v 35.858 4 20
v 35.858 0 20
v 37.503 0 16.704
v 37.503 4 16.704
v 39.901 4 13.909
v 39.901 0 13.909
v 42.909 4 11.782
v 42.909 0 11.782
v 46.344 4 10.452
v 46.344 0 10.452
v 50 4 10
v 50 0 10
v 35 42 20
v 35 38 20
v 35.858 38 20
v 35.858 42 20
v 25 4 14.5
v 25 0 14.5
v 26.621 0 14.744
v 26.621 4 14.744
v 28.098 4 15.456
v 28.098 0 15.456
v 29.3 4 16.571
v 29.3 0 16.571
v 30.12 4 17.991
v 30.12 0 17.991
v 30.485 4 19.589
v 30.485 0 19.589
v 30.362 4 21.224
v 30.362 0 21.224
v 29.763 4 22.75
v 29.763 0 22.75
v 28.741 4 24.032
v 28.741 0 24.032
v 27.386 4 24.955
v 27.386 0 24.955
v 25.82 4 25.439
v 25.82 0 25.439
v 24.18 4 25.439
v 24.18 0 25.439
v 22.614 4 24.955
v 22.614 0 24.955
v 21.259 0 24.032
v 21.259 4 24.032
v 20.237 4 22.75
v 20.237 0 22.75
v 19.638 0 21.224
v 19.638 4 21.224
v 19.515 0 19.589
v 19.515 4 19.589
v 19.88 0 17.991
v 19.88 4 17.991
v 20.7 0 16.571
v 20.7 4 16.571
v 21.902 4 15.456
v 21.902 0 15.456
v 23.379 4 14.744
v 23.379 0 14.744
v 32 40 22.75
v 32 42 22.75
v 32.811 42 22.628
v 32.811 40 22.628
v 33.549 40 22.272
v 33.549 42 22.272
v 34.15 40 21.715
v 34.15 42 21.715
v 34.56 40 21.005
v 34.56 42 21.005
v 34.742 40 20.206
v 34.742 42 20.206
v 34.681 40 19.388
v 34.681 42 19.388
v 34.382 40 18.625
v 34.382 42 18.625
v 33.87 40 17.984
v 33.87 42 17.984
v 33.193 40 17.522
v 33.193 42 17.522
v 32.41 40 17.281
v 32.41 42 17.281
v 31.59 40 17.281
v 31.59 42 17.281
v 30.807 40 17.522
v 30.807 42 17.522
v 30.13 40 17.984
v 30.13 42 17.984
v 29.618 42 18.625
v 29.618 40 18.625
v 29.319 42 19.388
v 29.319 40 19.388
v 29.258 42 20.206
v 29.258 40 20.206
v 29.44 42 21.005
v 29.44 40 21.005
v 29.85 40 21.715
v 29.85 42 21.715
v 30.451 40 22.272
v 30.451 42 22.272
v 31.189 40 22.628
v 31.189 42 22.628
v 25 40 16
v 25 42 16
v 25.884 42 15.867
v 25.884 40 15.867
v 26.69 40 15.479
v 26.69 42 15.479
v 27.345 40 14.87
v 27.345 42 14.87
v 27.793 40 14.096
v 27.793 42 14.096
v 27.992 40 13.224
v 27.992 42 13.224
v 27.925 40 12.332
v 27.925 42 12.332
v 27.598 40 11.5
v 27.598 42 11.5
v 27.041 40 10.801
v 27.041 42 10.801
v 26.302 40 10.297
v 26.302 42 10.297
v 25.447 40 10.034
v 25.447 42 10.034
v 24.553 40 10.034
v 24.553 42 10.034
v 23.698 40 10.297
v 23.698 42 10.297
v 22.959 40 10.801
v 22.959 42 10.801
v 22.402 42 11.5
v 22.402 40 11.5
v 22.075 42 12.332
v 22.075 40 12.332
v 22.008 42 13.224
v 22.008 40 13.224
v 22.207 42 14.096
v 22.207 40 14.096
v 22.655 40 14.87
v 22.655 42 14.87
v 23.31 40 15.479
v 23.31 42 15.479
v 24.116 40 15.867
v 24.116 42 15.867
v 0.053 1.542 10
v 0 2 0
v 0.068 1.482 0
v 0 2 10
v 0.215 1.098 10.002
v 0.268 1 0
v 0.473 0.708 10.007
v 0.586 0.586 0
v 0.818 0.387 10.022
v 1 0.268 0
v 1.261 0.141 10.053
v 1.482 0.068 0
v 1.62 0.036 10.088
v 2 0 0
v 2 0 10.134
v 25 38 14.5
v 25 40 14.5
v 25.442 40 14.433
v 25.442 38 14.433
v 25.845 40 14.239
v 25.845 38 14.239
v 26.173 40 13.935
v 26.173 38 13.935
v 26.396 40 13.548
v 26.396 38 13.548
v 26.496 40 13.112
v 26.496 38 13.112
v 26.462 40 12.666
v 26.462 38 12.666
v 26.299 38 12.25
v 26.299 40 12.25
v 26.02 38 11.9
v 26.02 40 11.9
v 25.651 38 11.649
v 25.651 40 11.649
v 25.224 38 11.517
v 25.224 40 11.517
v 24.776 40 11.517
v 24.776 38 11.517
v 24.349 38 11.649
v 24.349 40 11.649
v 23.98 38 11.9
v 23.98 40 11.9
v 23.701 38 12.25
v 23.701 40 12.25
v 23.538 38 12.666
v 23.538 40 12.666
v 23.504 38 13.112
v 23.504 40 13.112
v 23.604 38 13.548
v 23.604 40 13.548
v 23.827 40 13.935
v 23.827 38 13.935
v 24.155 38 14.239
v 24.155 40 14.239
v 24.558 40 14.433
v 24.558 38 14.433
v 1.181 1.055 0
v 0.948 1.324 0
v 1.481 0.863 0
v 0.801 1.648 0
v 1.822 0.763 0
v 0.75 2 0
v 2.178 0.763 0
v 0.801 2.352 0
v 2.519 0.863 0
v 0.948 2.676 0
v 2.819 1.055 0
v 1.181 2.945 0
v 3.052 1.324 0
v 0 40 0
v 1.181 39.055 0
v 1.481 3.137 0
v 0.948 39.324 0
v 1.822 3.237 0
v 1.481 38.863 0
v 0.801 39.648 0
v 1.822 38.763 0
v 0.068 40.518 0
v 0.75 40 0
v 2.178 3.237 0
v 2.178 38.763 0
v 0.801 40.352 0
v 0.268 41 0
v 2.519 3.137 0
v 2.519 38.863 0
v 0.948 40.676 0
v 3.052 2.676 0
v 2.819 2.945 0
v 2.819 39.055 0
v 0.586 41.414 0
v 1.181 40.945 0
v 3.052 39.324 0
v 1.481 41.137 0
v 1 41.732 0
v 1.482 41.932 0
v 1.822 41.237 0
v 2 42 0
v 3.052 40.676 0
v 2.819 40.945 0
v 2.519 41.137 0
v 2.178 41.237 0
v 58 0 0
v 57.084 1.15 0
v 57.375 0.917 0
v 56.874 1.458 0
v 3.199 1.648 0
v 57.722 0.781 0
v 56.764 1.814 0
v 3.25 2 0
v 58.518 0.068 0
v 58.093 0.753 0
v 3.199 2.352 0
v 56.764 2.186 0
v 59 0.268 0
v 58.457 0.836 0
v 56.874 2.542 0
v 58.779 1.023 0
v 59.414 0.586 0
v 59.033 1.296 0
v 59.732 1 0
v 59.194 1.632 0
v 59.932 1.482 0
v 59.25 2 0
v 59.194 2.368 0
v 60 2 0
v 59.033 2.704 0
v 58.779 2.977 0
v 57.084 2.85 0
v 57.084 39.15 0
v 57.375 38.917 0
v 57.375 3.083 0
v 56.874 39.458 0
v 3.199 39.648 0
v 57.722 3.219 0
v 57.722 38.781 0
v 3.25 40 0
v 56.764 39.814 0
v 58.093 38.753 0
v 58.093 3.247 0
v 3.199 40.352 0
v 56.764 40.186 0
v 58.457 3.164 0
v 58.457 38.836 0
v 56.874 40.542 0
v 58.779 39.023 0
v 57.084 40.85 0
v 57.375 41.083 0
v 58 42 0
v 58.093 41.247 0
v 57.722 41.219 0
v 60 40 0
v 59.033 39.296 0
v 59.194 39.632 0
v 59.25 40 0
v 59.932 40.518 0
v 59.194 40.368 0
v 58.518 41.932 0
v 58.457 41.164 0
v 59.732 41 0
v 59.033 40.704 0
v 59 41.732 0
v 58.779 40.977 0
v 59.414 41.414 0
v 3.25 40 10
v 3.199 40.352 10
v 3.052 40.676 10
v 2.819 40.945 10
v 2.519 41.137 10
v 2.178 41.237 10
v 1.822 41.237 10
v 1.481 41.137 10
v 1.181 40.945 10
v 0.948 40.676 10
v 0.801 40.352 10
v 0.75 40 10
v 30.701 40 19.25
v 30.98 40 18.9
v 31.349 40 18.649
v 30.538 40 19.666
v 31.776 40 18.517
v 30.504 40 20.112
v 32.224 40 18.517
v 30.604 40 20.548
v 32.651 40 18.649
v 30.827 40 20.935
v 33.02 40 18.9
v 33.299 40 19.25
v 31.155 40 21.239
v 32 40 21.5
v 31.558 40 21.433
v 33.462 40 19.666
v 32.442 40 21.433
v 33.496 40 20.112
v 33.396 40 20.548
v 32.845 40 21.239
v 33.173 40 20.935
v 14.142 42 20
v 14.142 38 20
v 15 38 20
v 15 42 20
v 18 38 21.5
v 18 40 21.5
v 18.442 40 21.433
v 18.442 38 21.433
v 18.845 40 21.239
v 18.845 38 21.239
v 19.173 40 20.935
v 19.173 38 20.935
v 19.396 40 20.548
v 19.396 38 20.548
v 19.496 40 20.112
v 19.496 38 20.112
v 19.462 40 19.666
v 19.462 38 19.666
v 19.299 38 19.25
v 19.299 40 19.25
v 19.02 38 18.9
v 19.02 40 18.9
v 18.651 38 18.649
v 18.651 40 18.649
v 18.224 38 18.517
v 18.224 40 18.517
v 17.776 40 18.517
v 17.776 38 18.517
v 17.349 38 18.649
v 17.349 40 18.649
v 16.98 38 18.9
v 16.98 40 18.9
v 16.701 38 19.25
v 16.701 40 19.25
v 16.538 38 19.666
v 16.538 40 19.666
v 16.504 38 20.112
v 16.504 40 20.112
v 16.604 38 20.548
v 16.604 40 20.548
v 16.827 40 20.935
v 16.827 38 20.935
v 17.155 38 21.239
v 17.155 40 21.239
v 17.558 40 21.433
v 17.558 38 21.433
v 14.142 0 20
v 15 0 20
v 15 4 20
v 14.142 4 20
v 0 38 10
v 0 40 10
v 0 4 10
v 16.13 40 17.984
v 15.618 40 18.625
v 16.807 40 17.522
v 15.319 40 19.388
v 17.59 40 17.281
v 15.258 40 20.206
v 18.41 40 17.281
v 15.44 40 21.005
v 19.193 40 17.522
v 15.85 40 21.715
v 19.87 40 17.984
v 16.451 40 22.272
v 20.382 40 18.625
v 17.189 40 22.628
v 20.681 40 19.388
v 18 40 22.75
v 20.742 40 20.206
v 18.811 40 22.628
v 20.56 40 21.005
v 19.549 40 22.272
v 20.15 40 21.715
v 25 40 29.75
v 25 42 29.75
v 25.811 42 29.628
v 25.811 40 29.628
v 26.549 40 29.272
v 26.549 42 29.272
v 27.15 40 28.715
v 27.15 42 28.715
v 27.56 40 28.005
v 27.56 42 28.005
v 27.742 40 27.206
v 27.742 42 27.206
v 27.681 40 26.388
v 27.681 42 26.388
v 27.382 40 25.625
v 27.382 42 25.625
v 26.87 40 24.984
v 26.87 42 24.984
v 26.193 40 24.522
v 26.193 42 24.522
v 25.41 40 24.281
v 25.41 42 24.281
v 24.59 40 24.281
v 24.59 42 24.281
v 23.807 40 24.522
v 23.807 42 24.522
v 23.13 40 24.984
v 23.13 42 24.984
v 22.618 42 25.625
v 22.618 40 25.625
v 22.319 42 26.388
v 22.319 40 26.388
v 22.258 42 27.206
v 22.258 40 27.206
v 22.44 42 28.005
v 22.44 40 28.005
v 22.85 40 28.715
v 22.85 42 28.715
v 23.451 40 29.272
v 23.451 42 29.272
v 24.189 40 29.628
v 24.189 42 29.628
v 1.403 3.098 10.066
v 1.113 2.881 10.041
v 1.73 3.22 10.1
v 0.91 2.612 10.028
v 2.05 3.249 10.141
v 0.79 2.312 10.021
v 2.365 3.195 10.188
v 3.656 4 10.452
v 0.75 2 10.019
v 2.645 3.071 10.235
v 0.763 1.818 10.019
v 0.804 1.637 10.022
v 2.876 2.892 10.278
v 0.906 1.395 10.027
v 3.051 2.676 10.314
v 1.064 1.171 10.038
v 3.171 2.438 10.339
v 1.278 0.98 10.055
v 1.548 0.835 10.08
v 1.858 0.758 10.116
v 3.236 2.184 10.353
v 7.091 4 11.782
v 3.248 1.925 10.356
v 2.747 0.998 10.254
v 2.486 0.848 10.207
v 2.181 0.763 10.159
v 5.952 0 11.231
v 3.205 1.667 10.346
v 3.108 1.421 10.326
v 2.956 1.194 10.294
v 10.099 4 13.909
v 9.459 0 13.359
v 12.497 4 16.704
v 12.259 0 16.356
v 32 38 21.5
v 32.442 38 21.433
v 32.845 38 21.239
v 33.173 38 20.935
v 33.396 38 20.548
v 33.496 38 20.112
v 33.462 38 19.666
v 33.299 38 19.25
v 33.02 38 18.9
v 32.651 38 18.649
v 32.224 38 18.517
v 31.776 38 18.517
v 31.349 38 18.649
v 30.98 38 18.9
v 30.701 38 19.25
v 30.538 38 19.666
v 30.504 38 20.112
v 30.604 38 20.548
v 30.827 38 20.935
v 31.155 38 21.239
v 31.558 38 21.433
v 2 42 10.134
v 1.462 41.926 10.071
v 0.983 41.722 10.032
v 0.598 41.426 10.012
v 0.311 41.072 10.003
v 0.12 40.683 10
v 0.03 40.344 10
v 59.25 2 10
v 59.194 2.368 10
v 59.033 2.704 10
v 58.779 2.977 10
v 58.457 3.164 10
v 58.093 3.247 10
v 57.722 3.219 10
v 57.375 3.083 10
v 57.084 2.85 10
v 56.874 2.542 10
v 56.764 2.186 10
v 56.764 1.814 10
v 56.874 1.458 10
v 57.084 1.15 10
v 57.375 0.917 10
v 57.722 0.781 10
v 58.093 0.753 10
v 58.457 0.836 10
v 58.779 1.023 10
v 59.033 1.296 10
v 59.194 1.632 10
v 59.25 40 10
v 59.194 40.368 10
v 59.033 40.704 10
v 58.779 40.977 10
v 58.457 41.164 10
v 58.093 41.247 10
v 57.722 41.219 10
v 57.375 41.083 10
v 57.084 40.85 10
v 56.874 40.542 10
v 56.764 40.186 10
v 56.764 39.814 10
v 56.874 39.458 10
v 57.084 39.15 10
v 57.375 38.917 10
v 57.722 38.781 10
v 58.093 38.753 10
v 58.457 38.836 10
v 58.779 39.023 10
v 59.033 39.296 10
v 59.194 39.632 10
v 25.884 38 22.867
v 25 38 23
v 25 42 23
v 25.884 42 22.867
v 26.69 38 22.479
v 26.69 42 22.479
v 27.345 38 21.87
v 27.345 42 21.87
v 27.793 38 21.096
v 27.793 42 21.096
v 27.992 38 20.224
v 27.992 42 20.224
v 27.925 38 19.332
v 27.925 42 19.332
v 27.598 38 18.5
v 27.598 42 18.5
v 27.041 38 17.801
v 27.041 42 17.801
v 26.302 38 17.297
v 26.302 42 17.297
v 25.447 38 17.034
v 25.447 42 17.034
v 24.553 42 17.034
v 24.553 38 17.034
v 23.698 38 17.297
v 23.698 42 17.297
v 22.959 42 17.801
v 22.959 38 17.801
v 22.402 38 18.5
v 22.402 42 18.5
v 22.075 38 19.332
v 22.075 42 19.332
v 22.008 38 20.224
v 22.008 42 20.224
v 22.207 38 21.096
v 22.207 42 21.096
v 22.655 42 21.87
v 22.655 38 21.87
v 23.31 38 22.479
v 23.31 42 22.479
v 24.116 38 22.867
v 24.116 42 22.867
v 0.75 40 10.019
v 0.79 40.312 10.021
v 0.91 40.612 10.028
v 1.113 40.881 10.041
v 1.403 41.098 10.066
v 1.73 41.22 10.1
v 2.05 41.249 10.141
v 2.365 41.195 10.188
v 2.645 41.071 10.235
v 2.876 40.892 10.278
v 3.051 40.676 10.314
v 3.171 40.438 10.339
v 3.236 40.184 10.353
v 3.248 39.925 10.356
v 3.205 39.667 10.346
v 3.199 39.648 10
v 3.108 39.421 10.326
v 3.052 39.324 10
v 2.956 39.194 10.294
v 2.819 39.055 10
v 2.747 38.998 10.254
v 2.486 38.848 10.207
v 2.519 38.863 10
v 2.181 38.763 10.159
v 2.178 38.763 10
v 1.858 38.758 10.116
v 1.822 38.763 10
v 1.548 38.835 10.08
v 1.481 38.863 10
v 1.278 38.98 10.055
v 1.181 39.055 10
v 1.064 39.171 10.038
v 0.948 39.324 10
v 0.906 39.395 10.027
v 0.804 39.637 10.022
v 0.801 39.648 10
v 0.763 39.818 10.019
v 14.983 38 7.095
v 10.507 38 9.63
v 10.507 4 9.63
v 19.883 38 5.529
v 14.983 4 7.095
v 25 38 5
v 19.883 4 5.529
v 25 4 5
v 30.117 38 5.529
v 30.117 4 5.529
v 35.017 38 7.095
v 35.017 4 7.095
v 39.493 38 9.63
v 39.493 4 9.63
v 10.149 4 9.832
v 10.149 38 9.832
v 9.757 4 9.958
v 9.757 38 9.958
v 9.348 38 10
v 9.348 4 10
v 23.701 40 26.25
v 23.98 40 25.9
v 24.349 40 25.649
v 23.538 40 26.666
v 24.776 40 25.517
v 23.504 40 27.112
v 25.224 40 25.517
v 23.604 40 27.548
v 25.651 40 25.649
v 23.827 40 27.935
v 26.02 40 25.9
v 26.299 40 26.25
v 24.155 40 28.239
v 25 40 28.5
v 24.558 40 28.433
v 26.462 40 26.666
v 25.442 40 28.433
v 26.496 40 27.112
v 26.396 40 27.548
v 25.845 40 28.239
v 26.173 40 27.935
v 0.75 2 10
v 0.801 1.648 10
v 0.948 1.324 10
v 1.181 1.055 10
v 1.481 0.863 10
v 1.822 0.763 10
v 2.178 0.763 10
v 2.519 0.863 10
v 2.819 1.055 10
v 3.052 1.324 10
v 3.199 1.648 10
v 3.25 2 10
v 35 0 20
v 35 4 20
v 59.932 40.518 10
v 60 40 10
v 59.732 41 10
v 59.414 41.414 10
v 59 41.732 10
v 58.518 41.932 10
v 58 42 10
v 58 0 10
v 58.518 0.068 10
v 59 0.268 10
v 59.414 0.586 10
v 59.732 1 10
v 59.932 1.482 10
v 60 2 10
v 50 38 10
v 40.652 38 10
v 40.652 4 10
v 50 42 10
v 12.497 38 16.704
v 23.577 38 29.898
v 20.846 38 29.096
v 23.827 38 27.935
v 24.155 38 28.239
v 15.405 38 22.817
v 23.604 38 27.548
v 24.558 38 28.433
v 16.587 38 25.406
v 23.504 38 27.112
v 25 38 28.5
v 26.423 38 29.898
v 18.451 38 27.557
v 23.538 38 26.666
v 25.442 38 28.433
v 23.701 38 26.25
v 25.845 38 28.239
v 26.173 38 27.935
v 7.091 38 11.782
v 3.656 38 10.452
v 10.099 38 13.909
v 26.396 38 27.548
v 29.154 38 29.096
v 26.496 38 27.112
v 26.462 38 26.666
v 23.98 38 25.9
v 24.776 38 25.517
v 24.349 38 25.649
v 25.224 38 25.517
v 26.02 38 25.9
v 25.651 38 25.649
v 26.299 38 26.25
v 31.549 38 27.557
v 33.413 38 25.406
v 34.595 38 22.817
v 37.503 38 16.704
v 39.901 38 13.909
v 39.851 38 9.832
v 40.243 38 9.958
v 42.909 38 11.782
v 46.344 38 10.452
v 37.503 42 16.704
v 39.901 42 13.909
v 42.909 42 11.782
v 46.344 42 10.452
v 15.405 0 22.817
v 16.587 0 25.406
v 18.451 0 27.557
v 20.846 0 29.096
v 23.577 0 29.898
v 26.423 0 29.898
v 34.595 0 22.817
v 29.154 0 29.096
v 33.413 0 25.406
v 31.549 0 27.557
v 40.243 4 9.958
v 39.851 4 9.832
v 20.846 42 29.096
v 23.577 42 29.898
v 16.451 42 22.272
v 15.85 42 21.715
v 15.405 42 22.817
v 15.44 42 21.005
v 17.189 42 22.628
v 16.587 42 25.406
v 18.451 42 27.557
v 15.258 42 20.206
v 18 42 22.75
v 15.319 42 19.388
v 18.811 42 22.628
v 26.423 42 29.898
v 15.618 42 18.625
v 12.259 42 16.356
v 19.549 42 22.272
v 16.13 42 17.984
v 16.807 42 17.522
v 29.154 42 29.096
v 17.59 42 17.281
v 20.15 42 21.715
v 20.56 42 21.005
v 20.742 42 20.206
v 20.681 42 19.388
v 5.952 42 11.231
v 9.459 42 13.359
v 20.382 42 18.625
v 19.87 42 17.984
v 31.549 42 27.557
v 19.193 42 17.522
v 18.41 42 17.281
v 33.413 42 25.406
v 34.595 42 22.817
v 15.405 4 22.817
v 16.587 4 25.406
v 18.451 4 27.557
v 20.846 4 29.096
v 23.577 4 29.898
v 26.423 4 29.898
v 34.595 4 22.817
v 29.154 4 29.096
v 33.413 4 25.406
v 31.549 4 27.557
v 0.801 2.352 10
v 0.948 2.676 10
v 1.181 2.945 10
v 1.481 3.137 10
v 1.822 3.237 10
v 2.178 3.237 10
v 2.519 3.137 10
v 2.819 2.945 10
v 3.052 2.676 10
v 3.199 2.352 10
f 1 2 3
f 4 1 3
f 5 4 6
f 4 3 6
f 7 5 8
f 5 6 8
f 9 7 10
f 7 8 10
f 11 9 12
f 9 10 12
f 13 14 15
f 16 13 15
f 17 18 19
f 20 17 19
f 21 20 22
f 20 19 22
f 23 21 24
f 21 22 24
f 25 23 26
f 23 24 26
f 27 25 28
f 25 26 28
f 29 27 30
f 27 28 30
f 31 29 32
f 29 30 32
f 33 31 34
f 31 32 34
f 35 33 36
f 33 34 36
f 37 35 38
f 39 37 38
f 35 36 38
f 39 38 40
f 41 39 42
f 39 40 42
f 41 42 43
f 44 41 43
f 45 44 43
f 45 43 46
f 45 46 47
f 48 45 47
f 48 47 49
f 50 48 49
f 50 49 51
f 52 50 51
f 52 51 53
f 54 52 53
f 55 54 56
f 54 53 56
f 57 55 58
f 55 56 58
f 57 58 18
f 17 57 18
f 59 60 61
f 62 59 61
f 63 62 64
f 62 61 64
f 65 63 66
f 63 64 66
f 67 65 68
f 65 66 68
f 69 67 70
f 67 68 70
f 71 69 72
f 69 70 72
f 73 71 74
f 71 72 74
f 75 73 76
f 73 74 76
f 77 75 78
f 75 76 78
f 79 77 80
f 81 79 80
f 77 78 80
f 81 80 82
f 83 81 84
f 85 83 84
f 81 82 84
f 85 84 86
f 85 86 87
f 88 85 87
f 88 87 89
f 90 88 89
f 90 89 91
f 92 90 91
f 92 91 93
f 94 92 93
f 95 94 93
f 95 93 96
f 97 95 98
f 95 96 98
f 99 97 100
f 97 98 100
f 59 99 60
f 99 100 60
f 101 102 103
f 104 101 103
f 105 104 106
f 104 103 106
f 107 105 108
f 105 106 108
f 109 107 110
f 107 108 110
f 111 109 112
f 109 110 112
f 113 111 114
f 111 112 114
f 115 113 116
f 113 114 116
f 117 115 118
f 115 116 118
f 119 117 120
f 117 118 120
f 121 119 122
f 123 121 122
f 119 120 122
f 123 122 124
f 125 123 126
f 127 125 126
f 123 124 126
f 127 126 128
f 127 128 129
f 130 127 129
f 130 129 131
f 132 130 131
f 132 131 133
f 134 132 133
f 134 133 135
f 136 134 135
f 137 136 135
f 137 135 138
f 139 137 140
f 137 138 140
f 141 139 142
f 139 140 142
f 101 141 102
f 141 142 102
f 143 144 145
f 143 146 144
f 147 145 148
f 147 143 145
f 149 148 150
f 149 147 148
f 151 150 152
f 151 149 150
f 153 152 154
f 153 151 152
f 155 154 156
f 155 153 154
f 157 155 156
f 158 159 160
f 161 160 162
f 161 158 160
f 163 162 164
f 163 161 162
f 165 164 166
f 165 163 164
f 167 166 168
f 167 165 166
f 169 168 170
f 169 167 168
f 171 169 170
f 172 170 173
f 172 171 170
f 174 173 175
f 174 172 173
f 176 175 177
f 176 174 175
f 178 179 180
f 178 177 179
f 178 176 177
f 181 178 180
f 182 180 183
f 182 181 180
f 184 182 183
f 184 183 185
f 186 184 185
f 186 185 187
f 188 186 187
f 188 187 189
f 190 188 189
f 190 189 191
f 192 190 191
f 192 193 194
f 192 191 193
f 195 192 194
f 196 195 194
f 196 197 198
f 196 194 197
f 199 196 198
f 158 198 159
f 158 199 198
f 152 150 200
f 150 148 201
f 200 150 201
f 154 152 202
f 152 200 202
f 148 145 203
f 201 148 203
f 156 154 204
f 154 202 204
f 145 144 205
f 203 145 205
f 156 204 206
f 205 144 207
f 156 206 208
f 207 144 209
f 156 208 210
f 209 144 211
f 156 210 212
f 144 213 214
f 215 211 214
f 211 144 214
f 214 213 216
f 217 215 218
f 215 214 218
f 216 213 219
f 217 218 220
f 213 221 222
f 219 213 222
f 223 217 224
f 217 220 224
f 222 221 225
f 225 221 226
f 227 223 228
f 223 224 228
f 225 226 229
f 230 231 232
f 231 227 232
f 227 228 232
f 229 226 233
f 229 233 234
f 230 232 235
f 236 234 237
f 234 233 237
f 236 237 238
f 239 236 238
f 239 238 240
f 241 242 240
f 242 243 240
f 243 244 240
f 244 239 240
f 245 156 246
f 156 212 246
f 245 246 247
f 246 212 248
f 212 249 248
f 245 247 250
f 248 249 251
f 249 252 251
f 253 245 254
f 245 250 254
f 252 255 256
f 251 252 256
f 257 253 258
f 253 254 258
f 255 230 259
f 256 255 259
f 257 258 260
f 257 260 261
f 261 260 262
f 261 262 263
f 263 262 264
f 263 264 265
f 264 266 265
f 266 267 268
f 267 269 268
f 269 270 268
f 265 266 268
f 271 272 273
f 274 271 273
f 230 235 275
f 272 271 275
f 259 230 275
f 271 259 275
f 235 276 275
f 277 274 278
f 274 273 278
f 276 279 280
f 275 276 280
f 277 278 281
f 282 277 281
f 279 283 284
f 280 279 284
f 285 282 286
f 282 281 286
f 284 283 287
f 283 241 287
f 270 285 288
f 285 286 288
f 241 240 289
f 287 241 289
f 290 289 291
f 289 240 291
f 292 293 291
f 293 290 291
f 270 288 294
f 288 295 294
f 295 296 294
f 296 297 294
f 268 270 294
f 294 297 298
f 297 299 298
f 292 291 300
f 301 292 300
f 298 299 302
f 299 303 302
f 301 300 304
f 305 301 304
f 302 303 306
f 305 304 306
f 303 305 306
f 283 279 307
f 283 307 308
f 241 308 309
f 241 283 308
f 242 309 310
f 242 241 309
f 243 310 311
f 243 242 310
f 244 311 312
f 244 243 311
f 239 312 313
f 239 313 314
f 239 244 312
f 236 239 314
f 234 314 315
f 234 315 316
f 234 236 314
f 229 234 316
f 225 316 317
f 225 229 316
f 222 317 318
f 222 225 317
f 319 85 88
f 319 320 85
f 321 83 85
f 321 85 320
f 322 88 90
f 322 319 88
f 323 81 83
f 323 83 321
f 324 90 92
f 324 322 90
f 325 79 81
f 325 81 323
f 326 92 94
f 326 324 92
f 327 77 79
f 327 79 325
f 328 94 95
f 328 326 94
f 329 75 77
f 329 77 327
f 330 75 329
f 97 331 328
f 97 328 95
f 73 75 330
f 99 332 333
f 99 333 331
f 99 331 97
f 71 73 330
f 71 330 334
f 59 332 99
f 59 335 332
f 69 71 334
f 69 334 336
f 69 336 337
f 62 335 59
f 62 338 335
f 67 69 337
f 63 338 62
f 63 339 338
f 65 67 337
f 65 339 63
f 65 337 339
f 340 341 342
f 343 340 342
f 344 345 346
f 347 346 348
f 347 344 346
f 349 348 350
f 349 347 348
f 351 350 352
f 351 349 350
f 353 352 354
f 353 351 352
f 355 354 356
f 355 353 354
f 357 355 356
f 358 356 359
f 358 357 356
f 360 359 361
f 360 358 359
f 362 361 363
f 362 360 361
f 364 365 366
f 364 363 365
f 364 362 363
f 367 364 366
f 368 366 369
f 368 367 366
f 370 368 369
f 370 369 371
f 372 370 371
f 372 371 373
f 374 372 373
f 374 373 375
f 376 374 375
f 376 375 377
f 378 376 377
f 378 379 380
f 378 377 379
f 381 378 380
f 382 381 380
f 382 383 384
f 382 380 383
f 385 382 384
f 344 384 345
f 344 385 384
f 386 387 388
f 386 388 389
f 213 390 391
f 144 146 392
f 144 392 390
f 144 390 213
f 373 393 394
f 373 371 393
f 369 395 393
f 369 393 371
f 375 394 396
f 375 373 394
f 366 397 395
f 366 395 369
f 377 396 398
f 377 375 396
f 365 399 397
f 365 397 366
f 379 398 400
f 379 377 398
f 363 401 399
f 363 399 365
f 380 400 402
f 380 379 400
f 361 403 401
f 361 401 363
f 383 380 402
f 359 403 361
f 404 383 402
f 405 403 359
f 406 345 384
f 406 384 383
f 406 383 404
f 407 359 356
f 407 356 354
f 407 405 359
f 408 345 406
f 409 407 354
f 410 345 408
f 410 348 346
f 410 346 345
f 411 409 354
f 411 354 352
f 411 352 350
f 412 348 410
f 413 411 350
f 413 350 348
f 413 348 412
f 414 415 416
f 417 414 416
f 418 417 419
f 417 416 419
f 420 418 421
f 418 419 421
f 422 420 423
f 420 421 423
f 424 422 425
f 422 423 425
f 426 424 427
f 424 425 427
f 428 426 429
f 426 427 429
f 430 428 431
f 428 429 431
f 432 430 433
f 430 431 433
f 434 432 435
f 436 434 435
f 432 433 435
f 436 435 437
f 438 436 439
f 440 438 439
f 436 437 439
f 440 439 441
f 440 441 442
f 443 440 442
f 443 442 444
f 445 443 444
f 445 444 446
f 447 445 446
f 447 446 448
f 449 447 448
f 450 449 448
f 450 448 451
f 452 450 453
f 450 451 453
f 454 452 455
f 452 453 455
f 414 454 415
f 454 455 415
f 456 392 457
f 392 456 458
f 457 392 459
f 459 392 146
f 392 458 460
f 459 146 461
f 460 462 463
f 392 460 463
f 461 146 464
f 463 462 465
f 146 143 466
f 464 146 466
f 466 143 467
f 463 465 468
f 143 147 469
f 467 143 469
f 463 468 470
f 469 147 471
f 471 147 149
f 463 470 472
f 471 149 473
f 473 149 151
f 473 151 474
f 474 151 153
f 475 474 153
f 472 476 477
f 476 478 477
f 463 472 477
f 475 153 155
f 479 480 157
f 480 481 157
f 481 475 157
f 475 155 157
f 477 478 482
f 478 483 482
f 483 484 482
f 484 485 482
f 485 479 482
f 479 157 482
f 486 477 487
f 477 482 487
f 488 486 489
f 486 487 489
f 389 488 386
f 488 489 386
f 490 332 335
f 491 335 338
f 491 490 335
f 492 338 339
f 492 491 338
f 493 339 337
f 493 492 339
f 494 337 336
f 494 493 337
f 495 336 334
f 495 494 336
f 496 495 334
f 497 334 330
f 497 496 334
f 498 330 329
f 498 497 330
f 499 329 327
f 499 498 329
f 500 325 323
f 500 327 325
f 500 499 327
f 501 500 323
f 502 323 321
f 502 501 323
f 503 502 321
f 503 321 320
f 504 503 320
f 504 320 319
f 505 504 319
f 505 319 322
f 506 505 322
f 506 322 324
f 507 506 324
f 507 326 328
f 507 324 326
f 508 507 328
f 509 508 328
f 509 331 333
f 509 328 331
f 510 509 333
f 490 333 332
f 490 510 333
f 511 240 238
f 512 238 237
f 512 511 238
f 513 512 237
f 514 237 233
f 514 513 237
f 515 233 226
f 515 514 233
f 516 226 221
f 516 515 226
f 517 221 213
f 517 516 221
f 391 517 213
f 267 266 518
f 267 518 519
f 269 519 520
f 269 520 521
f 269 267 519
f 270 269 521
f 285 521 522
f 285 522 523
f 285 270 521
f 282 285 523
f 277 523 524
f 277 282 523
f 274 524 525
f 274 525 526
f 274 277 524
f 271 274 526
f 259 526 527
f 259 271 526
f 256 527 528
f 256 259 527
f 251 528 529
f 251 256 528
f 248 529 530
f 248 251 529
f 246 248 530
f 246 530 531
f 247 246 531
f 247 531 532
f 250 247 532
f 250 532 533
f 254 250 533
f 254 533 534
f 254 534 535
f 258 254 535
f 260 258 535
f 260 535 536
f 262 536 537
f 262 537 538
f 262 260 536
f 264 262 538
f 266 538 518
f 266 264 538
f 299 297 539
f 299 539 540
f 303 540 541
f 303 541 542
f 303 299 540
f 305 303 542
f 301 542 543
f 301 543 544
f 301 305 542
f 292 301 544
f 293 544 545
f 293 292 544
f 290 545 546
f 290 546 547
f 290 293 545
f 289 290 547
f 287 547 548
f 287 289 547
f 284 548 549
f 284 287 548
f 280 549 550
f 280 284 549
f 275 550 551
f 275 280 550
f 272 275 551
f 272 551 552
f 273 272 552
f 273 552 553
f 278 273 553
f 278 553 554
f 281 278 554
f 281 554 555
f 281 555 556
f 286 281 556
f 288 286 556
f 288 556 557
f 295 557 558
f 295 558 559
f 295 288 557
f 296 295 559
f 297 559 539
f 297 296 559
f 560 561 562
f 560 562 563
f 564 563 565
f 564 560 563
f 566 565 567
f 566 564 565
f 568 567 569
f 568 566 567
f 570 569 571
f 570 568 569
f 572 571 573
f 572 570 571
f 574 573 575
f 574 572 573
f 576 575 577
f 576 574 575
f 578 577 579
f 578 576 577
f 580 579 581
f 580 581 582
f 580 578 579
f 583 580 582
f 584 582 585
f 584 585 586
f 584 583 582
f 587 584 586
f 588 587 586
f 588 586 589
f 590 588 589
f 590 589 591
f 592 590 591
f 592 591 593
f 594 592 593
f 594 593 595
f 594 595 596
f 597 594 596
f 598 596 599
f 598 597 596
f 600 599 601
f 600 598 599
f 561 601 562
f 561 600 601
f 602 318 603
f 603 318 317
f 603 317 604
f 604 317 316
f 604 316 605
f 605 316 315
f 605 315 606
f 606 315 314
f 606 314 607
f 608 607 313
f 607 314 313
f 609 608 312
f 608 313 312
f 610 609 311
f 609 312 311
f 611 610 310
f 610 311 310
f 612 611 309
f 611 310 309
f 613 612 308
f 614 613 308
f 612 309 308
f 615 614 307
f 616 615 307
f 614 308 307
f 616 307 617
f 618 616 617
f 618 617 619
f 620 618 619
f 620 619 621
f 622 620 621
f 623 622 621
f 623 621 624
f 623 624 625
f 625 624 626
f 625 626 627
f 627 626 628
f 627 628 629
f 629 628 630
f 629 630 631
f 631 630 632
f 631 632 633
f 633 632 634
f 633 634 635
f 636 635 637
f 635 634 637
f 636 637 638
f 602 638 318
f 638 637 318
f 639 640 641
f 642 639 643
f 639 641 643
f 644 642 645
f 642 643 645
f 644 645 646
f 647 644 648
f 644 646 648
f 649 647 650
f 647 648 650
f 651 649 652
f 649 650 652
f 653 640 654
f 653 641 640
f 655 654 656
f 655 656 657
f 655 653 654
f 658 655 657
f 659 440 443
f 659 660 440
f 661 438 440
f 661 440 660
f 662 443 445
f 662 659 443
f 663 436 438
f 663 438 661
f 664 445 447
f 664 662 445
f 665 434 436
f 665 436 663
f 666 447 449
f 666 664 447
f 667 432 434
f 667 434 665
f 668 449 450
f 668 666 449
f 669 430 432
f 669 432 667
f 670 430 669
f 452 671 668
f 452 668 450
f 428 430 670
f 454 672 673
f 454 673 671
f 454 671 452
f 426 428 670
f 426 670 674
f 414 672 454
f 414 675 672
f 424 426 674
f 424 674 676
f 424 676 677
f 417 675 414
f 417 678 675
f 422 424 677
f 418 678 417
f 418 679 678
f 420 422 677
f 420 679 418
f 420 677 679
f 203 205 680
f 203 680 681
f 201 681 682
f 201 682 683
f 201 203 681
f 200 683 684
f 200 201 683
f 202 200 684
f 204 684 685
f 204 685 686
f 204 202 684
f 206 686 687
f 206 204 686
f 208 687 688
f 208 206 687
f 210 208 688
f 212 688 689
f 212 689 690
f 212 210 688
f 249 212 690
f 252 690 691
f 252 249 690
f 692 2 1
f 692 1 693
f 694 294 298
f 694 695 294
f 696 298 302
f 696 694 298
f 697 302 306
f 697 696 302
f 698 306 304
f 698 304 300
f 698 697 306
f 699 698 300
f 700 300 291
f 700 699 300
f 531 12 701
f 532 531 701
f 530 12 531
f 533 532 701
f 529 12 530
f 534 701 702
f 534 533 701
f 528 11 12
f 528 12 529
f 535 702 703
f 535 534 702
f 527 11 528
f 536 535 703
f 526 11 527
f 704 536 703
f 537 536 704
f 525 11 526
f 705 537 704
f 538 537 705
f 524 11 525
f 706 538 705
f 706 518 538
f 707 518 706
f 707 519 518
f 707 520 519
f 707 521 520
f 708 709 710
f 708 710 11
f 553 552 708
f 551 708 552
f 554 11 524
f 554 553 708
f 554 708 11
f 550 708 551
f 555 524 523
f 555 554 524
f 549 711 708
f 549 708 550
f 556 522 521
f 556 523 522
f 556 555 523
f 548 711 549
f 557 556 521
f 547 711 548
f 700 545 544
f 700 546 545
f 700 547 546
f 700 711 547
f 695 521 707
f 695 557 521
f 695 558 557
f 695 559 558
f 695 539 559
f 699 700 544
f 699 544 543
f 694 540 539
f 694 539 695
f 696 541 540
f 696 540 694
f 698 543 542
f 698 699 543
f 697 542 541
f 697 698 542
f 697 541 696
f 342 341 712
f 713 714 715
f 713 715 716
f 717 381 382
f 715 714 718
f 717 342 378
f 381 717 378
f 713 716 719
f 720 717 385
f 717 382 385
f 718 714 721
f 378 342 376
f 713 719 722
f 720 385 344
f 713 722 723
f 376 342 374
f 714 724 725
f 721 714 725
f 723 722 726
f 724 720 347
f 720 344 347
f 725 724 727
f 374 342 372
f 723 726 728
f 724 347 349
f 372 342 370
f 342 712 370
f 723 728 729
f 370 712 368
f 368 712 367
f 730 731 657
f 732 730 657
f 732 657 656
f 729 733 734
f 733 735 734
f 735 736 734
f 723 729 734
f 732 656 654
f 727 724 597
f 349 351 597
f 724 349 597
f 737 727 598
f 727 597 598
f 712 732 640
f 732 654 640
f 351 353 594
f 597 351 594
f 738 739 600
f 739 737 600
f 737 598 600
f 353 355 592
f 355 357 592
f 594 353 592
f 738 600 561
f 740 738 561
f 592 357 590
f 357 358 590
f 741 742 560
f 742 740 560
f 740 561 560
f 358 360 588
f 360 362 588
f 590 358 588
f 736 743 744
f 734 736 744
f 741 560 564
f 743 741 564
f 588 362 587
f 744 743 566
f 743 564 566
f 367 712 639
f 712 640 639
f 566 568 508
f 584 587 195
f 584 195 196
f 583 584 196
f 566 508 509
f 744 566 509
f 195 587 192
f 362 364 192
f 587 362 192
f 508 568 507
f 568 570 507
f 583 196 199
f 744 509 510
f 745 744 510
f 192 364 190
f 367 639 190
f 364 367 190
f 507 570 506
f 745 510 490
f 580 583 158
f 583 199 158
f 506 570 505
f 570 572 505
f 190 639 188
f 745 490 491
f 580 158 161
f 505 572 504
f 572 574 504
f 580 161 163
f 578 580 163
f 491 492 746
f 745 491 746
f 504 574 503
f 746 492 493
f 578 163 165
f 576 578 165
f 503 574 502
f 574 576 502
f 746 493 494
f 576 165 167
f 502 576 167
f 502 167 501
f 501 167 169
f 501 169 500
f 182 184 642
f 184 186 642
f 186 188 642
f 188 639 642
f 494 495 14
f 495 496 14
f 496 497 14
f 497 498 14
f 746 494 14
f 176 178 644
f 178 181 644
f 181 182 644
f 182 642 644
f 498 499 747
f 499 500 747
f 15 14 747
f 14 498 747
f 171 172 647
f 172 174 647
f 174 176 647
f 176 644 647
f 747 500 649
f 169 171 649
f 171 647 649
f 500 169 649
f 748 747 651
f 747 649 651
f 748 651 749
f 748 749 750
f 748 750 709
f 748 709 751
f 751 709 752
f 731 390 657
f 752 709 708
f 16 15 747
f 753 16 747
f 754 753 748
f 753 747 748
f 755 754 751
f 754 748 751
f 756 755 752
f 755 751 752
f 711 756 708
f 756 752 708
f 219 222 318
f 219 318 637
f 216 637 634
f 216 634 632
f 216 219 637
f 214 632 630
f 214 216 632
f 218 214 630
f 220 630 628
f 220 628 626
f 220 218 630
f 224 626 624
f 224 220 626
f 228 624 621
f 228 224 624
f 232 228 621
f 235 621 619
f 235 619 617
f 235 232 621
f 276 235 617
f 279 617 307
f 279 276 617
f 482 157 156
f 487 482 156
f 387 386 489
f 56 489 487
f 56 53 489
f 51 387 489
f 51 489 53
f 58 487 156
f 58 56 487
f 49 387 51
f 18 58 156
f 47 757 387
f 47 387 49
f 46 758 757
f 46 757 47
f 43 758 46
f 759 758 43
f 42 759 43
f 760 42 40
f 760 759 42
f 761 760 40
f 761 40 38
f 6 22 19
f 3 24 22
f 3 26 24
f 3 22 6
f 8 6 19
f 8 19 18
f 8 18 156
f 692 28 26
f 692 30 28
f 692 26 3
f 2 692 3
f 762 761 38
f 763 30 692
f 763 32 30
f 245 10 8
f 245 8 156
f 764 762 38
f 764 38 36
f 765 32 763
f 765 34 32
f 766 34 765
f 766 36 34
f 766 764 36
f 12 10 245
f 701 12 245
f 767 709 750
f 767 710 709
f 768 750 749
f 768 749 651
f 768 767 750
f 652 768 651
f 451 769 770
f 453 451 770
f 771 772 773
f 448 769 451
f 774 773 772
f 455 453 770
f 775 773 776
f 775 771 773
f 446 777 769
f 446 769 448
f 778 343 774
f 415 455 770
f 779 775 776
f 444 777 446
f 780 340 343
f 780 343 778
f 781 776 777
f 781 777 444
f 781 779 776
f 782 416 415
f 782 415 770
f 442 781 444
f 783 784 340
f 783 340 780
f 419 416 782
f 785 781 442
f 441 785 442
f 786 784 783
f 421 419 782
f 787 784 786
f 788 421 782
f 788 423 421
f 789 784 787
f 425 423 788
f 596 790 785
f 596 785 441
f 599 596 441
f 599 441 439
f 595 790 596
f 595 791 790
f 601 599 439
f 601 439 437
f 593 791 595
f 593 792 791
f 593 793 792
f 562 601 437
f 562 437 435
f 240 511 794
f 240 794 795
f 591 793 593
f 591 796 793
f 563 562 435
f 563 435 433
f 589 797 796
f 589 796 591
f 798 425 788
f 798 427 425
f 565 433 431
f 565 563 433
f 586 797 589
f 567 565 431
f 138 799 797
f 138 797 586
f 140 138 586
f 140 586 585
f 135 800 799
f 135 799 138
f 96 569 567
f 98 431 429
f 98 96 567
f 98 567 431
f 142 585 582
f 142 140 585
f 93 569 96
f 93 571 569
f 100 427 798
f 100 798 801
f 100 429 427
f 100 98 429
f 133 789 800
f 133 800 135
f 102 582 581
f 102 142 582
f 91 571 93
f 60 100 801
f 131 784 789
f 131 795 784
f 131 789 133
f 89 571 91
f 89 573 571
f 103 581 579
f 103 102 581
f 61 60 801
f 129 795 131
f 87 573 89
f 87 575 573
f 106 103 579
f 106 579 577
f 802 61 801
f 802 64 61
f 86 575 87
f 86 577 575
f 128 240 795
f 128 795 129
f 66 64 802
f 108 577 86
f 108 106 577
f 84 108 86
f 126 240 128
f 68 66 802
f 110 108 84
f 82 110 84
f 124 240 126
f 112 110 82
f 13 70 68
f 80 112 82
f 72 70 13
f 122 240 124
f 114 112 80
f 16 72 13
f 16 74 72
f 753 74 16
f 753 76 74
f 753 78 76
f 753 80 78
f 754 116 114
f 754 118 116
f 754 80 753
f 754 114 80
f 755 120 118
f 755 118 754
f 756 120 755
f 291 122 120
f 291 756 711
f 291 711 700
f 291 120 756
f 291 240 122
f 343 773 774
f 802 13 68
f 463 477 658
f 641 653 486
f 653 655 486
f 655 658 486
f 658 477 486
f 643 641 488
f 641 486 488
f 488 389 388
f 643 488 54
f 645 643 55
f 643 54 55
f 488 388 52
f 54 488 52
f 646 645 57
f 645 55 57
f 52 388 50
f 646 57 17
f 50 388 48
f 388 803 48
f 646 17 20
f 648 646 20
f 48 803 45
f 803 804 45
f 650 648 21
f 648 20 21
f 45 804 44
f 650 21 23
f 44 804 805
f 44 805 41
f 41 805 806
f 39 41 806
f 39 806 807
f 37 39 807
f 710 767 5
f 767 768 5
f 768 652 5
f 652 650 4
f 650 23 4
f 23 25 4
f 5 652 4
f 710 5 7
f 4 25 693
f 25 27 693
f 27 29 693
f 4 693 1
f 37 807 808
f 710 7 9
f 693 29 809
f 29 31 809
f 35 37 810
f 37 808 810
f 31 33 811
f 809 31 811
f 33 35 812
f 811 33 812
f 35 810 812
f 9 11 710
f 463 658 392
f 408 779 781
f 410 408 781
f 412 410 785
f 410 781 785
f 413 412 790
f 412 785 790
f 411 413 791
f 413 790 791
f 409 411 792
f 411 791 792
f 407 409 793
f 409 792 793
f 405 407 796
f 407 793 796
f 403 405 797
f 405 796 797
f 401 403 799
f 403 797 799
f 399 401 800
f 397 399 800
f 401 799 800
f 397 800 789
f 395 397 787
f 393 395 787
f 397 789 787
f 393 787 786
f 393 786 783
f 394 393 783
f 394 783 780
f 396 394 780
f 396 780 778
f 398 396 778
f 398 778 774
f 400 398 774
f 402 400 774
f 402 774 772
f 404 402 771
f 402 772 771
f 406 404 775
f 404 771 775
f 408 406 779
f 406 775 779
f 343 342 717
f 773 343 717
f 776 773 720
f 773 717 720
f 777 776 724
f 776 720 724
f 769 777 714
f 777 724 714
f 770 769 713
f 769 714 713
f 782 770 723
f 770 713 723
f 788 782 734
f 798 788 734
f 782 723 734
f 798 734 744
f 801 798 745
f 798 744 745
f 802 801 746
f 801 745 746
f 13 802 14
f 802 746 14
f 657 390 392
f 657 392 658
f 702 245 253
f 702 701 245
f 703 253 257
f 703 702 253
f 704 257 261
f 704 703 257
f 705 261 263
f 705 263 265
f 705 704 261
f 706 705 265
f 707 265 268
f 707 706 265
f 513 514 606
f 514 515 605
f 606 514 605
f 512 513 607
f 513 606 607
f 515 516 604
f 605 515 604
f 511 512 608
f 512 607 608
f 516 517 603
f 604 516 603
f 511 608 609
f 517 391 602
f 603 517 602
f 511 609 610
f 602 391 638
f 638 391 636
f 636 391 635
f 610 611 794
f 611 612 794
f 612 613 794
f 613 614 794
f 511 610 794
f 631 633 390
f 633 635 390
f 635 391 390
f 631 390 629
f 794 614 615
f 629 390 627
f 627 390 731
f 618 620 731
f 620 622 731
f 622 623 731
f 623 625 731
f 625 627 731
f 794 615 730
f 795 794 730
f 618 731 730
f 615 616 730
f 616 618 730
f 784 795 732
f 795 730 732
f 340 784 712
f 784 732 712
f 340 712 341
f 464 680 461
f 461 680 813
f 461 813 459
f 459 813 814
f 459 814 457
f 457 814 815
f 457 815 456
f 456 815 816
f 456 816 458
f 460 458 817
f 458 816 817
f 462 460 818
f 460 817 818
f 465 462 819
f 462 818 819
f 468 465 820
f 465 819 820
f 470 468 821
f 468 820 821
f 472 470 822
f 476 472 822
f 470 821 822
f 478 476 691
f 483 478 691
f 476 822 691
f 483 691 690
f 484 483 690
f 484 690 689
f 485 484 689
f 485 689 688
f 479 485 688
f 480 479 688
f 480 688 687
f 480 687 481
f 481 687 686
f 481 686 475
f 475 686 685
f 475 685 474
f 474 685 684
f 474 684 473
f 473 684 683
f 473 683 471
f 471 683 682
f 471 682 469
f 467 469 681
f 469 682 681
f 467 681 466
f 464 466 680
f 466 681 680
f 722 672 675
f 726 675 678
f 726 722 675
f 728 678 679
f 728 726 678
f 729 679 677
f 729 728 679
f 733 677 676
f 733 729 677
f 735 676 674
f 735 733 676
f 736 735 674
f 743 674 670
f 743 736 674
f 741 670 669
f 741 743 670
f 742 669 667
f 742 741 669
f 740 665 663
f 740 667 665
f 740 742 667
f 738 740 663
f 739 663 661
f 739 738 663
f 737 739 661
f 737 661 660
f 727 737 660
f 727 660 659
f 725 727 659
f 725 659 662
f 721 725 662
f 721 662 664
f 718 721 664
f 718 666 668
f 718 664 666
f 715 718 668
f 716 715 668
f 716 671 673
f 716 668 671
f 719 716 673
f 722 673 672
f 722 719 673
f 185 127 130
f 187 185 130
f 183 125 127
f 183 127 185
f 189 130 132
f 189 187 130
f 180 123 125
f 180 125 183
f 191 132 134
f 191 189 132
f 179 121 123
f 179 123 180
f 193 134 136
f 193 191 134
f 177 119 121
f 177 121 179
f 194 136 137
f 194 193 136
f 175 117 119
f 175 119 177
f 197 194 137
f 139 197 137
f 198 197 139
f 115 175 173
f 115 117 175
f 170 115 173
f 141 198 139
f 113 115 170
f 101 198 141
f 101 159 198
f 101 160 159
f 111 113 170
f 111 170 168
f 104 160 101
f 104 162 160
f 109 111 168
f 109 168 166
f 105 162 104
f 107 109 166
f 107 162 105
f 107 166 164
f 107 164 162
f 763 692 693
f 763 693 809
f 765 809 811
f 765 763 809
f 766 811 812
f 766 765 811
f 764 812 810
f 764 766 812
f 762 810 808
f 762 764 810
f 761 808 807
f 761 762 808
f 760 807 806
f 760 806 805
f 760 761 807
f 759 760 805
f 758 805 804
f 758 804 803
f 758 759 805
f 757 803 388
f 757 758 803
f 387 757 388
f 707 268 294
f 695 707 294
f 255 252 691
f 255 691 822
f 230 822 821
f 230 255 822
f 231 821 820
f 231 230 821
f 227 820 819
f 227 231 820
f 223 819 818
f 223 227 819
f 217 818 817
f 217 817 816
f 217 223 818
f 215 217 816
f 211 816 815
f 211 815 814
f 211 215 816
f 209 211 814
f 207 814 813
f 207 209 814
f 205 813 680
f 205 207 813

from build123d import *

# Parameters (mm, degrees)
SKETCH_7_W          = 60
SKETCH_7_H          = 42
SKETCH_7_R          = 1.25
EXTRUDE_4_DEPTH     = 10
SKETCH_8_R          = 25
CUT_EXTRUDE_2_DEPTH = 50
SKETCH_9_R          = 5.5
EXTRUDE_5_DEPTH     = 4
CUT_EXTRUDE_4_DEPTH = 4
EXTRUDE_START       = -4
SKETCH_11_R         = 1.5
SKETCH_11_R_2       = 3
EXTRUDE_6_DEPTH     = 4
SKETCH_12_R         = 3
SKETCH_12_R_2       = 2.75
CUT_EXTRUDE_6_DEPTH = 2
SKETCH_15_R         = 1.25
CUT_EXTRUDE_7_DEPTH = 22
FILLET_1_R          = 2
FILLET_2_R          = 2
FILLET_3_R          = 2
FILLET_4_R          = 2
FILLET_6_R          = 2
FILLET_7_R          = 2


with BuildPart() as part:
    # 草图7 → 凸台-拉伸4 (new body)
    with BuildSketch(Plane.XY):
        with Locations((30, 21)):
            Rectangle(SKETCH_7_W, SKETCH_7_H)
        with Locations((2, 40)):
            Circle(SKETCH_7_R, mode=Mode.SUBTRACT)
        with Locations((2, 2)):
            Circle(SKETCH_7_R, mode=Mode.SUBTRACT)
        with Locations((58, 2)):
            Circle(SKETCH_7_R, mode=Mode.SUBTRACT)
        with Locations((58, 40)):
            Circle(SKETCH_7_R, mode=Mode.SUBTRACT)
    extrude(amount=EXTRUDE_4_DEPTH)

    # 草图8 → 切除-拉伸2 (cut)
    with BuildSketch(Plane.XZ):
        with Locations((25, 30)):
            Circle(SKETCH_8_R)
    extrude(amount=-CUT_EXTRUDE_2_DEPTH, mode=Mode.SUBTRACT)

    # 草图9 → 凸台-拉伸5 (add)
    with BuildSketch(Plane.XZ):
        with BuildLine():
            Line((0, 20), (0, 10))
            Line((0, 10), (10, 10))
            ThreePointArc((10, 10), (25, 5), (40, 10))
            Line((40, 10), (50, 10))
            Line((50, 10), (50, 20))
            Line((50, 20), (35, 20))
            ThreePointArc((35, 20), (25, 30), (15, 20))
            Line((15, 20), (0, 20))
        make_face()
        with Locations(Location((25, 20, 0), (0, 0, 270))):
            Circle(SKETCH_9_R, mode=Mode.SUBTRACT)
    extrude(amount=-EXTRUDE_5_DEPTH)

    # 草图10 → 切除-拉伸4 (cut)
    with BuildSketch(Plane.XZ):
        with BuildLine():
            ThreePointArc((0, 10), (8.660254038, 12.752551286), (14.142135624, 20))
            Line((14.142135624, 20), (0, 20))
            Line((0, 20), (0, 10))
        make_face()
        with BuildLine():
            Line((0, 20), (14.142135624, 20))
            ThreePointArc((14.142135624, 20), (14.783978395, 22.463470319), (15, 25))
            ThreePointArc((15, 25), (-10.606601718, 35.606601718), (0, 10))
            Line((0, 10), (0, 20))
        make_face()
        with BuildLine():
            ThreePointArc((65, 25), (47.463470319, 39.783978395), (35.857864376, 20))
            Line((35.857864376, 20), (50, 20))
            Line((50, 20), (50, 10))
            ThreePointArc((50, 10), (60.606601718, 14.393398282), (65, 25))
        make_face()
        with BuildLine():
            Line((50, 20), (35.857864376, 20))
            ThreePointArc((35.857864376, 20), (41.339745962, 12.752551286), (50, 10))
            Line((50, 10), (50, 20))
        make_face()
    extrude(amount=-CUT_EXTRUDE_4_DEPTH, mode=Mode.SUBTRACT)

    # 草图11 → 凸台-拉伸6 (add)
    with BuildSketch(Plane(origin=(0, 42, 0), x_dir=(1, 0, 0), z_dir=(0, 1, 0)).offset(EXTRUDE_START)):
        with BuildLine():
            ThreePointArc((40, -10), (25, -5), (10, -10))
            Line((10, -10), (0, -10))
            ThreePointArc((0, -10), (8.660254038, -12.752551286), (14.142135624, -20))
            Line((14.142135624, -20), (15, -20))
            ThreePointArc((15, -20), (25, -30), (35, -20))
            Line((35, -20), (35.857864376, -20))
            ThreePointArc((35.857864376, -20), (41.339745962, -12.752551286), (50, -10))
            Line((50, -10), (40, -10))
        make_face()
        with Locations(Location((25, -13, 0), (0, 0, 270))):
            Circle(SKETCH_11_R, mode=Mode.SUBTRACT)
        with Locations(Location((18, -20, 0), (0, 0, 270))):
            Circle(SKETCH_11_R, mode=Mode.SUBTRACT)
        with Locations(Location((25, -27, 0), (0, 0, 270))):
            Circle(SKETCH_11_R, mode=Mode.SUBTRACT)
        with Locations(Location((25, -20, 0), (0, 0, 270))):
            Circle(SKETCH_11_R_2, mode=Mode.SUBTRACT)
        with Locations(Location((32, -20, 0), (0, 0, 270))):
            Circle(SKETCH_11_R, mode=Mode.SUBTRACT)
    extrude(amount=EXTRUDE_6_DEPTH)

    # 草图12 → 切除-拉伸6 (cut)
    with BuildSketch(Plane(origin=(0, 42, 0), x_dir=(1, 0, 0), z_dir=(0, 1, 0))):
        with Locations(Location((25, -13, 0), (0, 0, 270))):
            Circle(SKETCH_12_R)
        with Locations(Location((18, -20, 0), (0, 0, 270))):
            Circle(SKETCH_12_R_2)
        with Locations(Location((25, -27, 0), (0, 0, 270))):
            Circle(SKETCH_12_R_2)
        with Locations(Location((32, -20, 0), (0, 0, 270))):
            Circle(SKETCH_12_R_2)
    extrude(amount=-CUT_EXTRUDE_6_DEPTH, mode=Mode.SUBTRACT)

    # 草图15 → 切除-拉伸7 (cut)
    with BuildSketch(Plane(origin=(0, 0, 0), x_dir=(-1, 0, 0), z_dir=(0, 0, -1))):
        with Locations((-2, 2)):
            Circle(SKETCH_15_R)
        with Locations((-2, 40)):
            Circle(SKETCH_15_R)
    extrude(amount=-CUT_EXTRUDE_7_DEPTH, mode=Mode.SUBTRACT)

    # 圆角1
    fillet_1_edges = [part.edges().sort_by_distance(p)[0] for p in [
        (0, 0, 5),
    ]]
    fillet(fillet_1_edges, radius=FILLET_1_R)

    # 圆角2
    fillet_2_edges = [part.edges().sort_by_distance(p)[0] for p in [
        (60, 0, 5),
    ]]
    fillet(fillet_2_edges, radius=FILLET_2_R)

    # 圆角3
    fillet_3_edges = [part.edges().sort_by_distance(p)[0] for p in [
        (60, 42, 5),
    ]]
    fillet(fillet_3_edges, radius=FILLET_3_R)

    # 圆角4
    fillet_4_edges = [part.edges().sort_by_distance(p)[0] for p in [
        (0, 42, 5),
    ]]
    fillet(fillet_4_edges, radius=FILLET_4_R)

    # 圆角6
    fillet_6_edges = [part.edges().sort_by_distance(p)[0] for p in [
        (40, 21, 10),
    ]]
    fillet(fillet_6_edges, radius=FILLET_6_R)

    # 圆角7
    fillet_7_edges = [part.edges().sort_by_distance(p)[0] for p in [
        (10, 21, 10),
    ]]
    fillet(fillet_7_edges, radius=FILLET_7_R)


solid = part.part
